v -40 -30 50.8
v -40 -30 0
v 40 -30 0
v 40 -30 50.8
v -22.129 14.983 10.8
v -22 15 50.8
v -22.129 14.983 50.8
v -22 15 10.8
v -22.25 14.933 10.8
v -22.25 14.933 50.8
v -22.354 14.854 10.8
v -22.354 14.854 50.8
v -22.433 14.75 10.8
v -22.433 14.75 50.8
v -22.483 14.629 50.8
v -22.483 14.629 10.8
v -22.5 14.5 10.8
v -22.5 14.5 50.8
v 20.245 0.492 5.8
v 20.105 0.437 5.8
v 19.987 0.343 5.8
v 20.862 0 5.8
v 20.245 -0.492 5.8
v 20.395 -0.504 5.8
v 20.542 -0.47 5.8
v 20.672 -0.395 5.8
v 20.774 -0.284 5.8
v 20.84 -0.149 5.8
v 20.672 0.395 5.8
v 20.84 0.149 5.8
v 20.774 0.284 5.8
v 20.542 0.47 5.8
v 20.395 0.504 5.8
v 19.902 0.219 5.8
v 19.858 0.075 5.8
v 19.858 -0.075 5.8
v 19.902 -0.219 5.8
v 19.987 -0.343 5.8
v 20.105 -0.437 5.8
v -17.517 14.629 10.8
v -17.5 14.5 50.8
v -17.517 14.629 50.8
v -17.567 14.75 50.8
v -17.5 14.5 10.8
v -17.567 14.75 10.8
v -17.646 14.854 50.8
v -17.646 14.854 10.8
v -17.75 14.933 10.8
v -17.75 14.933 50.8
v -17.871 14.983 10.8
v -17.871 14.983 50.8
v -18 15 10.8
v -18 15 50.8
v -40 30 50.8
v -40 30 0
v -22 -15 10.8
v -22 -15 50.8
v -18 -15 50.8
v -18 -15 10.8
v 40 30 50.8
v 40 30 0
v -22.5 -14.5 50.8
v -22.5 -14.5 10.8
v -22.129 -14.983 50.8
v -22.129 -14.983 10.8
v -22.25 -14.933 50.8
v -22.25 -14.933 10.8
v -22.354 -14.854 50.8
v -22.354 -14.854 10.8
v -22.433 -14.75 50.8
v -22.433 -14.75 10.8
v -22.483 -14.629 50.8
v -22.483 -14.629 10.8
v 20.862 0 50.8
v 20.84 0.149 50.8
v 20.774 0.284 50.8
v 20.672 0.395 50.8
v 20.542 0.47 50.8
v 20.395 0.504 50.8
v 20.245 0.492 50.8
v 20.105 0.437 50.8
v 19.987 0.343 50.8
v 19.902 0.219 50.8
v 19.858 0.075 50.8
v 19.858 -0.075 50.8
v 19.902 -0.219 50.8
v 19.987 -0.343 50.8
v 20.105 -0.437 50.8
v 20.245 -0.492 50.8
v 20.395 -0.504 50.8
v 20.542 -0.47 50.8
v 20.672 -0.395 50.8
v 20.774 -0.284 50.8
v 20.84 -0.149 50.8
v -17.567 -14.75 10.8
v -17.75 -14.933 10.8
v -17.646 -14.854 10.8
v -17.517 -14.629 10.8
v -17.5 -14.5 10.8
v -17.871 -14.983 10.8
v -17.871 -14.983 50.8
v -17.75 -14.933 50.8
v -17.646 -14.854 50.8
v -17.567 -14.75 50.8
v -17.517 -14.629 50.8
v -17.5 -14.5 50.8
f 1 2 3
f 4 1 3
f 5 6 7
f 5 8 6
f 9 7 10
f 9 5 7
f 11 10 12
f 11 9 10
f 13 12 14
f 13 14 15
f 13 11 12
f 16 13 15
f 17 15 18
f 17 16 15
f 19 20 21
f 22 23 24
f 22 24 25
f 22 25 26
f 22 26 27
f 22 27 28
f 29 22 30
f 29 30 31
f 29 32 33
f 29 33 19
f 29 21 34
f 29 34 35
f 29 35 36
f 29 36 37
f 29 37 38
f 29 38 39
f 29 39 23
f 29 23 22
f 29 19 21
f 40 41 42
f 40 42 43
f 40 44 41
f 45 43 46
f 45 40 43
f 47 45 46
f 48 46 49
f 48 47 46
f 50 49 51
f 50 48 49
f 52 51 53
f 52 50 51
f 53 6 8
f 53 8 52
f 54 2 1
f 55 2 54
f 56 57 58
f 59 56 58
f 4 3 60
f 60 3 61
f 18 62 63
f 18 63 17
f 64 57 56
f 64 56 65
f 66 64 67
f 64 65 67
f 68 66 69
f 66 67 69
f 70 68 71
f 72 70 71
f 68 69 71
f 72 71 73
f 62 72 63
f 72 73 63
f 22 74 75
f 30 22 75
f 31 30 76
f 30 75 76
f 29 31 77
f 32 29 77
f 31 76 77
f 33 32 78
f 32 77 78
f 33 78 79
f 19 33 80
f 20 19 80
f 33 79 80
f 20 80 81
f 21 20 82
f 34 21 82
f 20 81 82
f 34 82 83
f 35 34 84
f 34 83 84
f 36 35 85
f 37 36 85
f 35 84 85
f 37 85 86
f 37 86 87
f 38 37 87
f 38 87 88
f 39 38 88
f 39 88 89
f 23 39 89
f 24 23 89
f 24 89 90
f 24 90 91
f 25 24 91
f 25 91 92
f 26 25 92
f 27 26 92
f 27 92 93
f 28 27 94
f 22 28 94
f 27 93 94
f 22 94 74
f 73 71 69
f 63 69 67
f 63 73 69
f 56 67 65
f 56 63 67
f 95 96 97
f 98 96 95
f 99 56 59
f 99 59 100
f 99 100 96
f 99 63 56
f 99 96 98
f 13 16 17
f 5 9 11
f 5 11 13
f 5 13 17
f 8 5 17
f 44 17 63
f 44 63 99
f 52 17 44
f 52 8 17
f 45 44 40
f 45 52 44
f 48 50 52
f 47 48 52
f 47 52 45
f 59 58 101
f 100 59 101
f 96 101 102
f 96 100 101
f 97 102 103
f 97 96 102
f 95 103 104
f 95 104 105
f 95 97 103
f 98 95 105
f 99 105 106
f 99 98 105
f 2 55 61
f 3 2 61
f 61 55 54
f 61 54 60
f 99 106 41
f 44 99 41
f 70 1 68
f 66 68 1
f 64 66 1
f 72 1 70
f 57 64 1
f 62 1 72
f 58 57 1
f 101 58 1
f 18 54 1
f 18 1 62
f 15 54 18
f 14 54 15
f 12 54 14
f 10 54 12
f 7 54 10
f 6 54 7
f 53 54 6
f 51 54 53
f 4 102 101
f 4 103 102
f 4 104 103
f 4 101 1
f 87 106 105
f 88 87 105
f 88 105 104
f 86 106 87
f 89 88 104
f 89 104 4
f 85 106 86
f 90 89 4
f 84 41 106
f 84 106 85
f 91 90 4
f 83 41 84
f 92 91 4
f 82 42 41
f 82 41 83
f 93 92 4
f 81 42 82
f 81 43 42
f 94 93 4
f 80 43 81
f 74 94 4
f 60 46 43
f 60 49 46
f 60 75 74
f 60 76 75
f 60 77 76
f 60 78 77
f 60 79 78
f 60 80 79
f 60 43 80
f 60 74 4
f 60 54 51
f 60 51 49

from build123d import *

# Parameters (mm, degrees)
F0_W     = 80
F0_H     = 60
F1_DEPTH = 50.8
F2_W     = 5
F2_H     = 30
F3_DEPTH = 40
F4_R     = 0.5
F5_R     = 0.505
F6_DEPTH = 45


with BuildPart() as f1:
    # F0 (on Top) → F1 (new body)
    with BuildSketch(Plane.XY):
        Rectangle(F0_W, F0_H)
    extrude(amount=F1_DEPTH)

    # F2 (on face) → F3 (cut)
    with BuildSketch(Plane.XY.offset(50.8)):
        with Locations((-20, 0)):
            Rectangle(F2_W, F2_H)
    extrude(amount=-F3_DEPTH, mode=Mode.SUBTRACT)

    # F4
    f4_edges = [f1.edges().sort_by_distance(p)[0] for p in [
        (-22.5, 15, 30.8),
        (-17.5, 15, 30.8),
        (-22.5, -15, 30.8),
        (-17.5, -15, 30.8),
    ]]
    fillet(f4_edges, radius=F4_R)

    # F5 (on face) → F6 (cut)
    with BuildSketch(Plane.XY.offset(50.8)):
        with Locations((20.357101, 0)):
            Circle(F5_R)
    extrude(amount=-F6_DEPTH, mode=Mode.SUBTRACT)


solid = f1.part
